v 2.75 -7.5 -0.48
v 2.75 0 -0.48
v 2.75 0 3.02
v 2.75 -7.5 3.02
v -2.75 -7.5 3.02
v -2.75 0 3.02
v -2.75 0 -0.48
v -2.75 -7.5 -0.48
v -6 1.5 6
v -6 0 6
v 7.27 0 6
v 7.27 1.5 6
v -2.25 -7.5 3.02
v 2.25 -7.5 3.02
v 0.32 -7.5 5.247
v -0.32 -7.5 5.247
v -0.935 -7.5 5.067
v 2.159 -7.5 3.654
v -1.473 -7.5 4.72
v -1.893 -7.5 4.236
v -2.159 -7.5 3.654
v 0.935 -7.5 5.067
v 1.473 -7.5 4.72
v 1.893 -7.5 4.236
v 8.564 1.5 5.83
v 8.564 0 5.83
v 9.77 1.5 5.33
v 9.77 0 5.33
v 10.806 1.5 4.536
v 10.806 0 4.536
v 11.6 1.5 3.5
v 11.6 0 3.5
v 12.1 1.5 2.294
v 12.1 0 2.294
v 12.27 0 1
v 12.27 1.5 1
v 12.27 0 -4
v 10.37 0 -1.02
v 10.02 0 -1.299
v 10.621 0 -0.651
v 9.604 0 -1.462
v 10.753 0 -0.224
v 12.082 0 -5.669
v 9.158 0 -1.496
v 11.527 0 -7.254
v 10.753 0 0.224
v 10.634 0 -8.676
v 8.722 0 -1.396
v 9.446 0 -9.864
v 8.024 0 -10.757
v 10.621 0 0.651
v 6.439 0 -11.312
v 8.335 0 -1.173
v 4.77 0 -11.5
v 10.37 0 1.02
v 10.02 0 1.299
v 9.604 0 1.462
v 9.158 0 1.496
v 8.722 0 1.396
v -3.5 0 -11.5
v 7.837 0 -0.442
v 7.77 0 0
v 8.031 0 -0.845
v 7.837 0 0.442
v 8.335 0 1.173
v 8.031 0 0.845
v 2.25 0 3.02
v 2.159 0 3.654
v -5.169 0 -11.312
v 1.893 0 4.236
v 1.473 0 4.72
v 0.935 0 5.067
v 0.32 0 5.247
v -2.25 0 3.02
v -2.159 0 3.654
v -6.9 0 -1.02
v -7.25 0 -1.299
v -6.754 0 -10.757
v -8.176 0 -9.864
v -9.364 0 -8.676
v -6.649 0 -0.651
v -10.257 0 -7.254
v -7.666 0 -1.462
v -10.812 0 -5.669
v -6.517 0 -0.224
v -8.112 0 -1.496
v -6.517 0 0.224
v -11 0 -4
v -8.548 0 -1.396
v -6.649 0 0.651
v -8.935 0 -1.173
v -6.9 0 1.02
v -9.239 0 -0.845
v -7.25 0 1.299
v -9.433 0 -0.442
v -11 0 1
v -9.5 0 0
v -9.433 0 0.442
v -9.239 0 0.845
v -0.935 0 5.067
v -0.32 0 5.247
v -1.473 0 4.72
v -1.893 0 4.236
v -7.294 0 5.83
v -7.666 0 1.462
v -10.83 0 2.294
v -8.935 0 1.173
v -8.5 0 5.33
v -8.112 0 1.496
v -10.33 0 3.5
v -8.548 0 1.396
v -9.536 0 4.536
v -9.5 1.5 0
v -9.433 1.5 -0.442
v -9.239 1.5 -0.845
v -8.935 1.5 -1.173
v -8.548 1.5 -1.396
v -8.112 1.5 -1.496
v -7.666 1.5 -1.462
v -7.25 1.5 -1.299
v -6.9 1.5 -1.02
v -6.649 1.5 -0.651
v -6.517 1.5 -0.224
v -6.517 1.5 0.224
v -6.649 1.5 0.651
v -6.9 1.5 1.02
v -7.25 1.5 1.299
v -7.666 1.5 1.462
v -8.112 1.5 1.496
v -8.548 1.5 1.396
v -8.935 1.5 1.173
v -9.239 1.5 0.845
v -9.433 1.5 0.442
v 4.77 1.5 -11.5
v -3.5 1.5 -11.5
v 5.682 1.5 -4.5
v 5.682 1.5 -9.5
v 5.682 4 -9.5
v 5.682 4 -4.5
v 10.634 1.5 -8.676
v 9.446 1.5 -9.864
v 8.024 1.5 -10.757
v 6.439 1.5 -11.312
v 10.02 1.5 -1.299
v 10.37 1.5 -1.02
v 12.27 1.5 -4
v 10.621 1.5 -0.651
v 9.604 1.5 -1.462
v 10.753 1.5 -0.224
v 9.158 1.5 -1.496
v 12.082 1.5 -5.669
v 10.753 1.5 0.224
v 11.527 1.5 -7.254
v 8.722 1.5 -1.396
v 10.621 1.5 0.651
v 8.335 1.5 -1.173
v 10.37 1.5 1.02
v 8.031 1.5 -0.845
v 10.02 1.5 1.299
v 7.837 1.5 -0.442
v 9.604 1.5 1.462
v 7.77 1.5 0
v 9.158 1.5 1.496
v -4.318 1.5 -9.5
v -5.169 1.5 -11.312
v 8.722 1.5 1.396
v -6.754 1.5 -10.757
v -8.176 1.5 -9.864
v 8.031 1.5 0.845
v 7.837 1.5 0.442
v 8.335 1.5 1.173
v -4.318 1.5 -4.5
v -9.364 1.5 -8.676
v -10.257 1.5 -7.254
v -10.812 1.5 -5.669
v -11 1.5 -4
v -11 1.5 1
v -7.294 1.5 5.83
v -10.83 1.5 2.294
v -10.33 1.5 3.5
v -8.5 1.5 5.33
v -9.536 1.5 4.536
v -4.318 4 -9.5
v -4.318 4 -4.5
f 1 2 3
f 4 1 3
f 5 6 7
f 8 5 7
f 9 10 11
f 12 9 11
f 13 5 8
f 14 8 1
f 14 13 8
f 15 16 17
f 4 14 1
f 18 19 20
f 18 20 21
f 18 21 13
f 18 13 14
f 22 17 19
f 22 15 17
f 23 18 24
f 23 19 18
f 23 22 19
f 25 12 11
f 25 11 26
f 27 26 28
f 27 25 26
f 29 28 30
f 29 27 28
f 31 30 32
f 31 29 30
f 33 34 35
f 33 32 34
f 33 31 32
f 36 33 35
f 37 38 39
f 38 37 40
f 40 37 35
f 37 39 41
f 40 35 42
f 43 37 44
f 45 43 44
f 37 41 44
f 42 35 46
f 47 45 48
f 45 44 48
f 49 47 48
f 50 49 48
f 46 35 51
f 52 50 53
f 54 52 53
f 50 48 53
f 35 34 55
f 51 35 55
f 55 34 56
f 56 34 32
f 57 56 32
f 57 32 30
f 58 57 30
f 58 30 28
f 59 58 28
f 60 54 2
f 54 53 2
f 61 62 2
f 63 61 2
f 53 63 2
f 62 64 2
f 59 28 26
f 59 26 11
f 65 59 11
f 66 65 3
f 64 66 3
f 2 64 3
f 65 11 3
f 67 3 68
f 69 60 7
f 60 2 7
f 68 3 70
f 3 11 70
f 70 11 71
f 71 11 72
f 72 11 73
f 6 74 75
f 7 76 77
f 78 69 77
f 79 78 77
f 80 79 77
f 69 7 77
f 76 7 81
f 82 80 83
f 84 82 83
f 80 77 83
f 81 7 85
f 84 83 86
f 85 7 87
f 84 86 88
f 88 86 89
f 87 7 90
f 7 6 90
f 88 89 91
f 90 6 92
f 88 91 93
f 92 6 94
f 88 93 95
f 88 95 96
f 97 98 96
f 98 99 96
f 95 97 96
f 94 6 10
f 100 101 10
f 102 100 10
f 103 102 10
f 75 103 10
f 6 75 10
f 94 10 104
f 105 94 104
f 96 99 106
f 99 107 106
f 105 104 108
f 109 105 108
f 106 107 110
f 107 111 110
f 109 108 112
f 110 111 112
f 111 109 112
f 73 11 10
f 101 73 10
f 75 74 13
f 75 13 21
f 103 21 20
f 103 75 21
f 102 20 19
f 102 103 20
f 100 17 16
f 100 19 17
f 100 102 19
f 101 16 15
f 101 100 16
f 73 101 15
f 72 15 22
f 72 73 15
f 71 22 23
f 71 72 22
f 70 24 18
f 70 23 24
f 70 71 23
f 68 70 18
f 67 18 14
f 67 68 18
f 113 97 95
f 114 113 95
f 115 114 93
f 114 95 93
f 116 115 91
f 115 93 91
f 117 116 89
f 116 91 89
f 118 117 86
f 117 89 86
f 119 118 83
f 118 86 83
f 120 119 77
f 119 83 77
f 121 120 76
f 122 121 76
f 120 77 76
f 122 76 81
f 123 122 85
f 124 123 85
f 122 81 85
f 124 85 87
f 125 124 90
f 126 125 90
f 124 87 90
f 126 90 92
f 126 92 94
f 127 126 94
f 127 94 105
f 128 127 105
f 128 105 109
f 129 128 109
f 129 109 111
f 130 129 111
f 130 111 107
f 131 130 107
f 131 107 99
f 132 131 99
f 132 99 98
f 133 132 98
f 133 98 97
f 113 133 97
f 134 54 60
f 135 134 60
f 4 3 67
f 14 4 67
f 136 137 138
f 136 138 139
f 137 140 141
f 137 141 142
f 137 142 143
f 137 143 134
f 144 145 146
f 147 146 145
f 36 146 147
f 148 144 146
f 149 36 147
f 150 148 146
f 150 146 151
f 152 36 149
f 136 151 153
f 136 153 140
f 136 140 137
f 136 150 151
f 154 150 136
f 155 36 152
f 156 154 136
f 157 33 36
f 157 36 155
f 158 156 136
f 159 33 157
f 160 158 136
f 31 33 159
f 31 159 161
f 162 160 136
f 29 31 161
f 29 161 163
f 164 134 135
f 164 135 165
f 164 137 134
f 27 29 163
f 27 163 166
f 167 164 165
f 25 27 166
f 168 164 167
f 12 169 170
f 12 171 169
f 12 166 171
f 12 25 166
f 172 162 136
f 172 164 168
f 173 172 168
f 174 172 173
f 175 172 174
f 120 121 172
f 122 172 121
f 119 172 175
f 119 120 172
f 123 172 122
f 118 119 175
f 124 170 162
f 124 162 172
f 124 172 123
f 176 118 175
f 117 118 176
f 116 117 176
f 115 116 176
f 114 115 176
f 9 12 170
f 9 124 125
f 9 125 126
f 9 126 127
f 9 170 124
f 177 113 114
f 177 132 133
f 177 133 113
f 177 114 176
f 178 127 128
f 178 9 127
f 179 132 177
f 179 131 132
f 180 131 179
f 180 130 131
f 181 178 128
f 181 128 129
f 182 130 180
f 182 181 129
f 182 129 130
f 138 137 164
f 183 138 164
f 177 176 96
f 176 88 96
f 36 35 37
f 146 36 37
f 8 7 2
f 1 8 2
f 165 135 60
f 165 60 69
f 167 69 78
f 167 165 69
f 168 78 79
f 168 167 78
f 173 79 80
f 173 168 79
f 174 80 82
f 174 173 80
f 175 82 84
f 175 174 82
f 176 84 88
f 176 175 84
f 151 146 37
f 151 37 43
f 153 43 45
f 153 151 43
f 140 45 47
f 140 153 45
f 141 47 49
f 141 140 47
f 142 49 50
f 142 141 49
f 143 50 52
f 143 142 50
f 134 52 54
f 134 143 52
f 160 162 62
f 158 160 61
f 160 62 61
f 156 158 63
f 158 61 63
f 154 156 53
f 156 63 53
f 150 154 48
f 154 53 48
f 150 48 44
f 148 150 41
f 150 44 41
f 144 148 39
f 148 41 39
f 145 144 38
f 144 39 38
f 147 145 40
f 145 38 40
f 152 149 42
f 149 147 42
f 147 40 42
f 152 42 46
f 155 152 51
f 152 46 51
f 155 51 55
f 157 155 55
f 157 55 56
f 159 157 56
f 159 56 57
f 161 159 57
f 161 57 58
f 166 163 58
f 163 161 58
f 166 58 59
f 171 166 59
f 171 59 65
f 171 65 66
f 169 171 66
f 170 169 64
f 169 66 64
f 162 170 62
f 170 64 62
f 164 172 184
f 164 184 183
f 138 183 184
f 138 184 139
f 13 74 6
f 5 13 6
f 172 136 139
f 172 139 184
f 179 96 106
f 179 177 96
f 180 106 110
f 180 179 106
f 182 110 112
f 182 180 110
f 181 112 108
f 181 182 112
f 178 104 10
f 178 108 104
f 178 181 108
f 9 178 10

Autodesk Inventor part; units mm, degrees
ref_plane "YZ Plane" through (0, 0, 0) normal (1, 0, 0) x (0, 1, 0)
ref_plane "XZ Plane" through (0, 0, 0) normal (0, 1, 0) x (-1, 0, 0)
ref_plane "XY Plane" through (0, 0, 0) normal (0, 0, 1) x (1, 0, 0)
sketch "Sketch1" plane through (0, 0, 0) normal (0, 1, 0) x (-1, 0, 0)
  line L0 (0, 0) -> (8, 0)
  line L1 (0, 0) -> (-9.27, 0)
  circle A0 centre (8, 0) radius 1.5
  circle A1 centre (-9.27, 0) radius 1.5
  line L2 (8, 0) -> (11, 0)
  line L3 (-9.27, 0) -> (-12.27, 0)
  line L4 (11, 0) -> (11, 6)
  line L5 (-12.27, 0) -> (-12.27, -11.5)
  line L6 (11, 6) -> (-12.27, 6)
  line L7 (-12.27, 6) -> (-12.27, -11.5)
  line L8 (-12.27, -11.5) -> (11, -11.5)
  line L9 (11, -11.5) -> (11, 6)
  dimension "d0" = 8
  dimension "d1" = 9.27
  dimension "d2" = 3
  dimension "d3" = 3
  dimension "d4" = 3
  dimension "d5" = 3
  dimension "d6" = 6
  dimension "d7" = 11.5
extrude "Extrusion1" add sketch "Sketch1" along normal blind 1.5 contours L1 A1 L3 L7 L6 L4 L2 A0 L0 | L0 A0 L2 L9 L8 L5 L3 A1 L1
fillet "Fillet1" radius 5 2 edges at (-11, 0.75, 6) (12.27, 0.75, 6)
fillet "Fillet2" radius 7.5 2 edges at (-11, 0.75, -11.5) (12.27, 0.75, -11.5)
sketch "Sketch2" plane through (0, 1.5, 0) normal (0, 1, 0) x (1, 0, 0)
  line L0 (4.77, 11.5) -> (-3.5, 11.5) projected
  line L1 (0, 11.5) -> (1.365, 11.5)
  line L2 (1.365, 11.5) -> (0, 11.5)
  line L3 (0, 11.5) -> (0, 9.5)
  line L4 (0, 9.5) -> (-4.3175, 9.5)
  line L5 (-4.3175, 9.5) -> (5.6825, 9.5)
  line L6 (5.6825, 9.5) -> (5.6825, 4.5)
  line L7 (5.6825, 4.5) -> (-4.3175, 4.5)
  line L8 (-4.3175, 4.5) -> (-4.3175, 9.5)
  point P0 (0, 0)
  dimension "d12" = 1.365
  dimension "d13" = 2
  dimension "d14" = 4.3175
  dimension "d15" = 10
  dimension "d16" = 5
extrude "Extrusion2" add sketch "Sketch2" along normal blind 2.5
sketch "Sketch3" plane through (0, 0, 0) normal (0, -1, 0) x (1, 0, 0)
  line L0 (0, 0) -> (0, -0.48)
  line L1 (0, -0.48) -> (2.75, -0.48)
  line L2 (2.75, -0.48) -> (2.75, 3.02)
  line L3 (2.75, 3.02) -> (-2.75, 3.02)
  line L4 (-2.75, 3.02) -> (-2.75, -0.48)
  line L5 (-2.75, -0.48) -> (0, -0.48)
  circle A0 centre (0, 3.02) radius 2.25
  dimension "d19" = 0.48
  dimension "d20" = 2.75
  dimension "d21" = 3.5
  dimension "d22" = 5.5
  dimension "d23" = 4.5
extrude "Extrusion3" add sketch "Sketch3" along normal blind 7.5
properties part number "TSSP Board"
